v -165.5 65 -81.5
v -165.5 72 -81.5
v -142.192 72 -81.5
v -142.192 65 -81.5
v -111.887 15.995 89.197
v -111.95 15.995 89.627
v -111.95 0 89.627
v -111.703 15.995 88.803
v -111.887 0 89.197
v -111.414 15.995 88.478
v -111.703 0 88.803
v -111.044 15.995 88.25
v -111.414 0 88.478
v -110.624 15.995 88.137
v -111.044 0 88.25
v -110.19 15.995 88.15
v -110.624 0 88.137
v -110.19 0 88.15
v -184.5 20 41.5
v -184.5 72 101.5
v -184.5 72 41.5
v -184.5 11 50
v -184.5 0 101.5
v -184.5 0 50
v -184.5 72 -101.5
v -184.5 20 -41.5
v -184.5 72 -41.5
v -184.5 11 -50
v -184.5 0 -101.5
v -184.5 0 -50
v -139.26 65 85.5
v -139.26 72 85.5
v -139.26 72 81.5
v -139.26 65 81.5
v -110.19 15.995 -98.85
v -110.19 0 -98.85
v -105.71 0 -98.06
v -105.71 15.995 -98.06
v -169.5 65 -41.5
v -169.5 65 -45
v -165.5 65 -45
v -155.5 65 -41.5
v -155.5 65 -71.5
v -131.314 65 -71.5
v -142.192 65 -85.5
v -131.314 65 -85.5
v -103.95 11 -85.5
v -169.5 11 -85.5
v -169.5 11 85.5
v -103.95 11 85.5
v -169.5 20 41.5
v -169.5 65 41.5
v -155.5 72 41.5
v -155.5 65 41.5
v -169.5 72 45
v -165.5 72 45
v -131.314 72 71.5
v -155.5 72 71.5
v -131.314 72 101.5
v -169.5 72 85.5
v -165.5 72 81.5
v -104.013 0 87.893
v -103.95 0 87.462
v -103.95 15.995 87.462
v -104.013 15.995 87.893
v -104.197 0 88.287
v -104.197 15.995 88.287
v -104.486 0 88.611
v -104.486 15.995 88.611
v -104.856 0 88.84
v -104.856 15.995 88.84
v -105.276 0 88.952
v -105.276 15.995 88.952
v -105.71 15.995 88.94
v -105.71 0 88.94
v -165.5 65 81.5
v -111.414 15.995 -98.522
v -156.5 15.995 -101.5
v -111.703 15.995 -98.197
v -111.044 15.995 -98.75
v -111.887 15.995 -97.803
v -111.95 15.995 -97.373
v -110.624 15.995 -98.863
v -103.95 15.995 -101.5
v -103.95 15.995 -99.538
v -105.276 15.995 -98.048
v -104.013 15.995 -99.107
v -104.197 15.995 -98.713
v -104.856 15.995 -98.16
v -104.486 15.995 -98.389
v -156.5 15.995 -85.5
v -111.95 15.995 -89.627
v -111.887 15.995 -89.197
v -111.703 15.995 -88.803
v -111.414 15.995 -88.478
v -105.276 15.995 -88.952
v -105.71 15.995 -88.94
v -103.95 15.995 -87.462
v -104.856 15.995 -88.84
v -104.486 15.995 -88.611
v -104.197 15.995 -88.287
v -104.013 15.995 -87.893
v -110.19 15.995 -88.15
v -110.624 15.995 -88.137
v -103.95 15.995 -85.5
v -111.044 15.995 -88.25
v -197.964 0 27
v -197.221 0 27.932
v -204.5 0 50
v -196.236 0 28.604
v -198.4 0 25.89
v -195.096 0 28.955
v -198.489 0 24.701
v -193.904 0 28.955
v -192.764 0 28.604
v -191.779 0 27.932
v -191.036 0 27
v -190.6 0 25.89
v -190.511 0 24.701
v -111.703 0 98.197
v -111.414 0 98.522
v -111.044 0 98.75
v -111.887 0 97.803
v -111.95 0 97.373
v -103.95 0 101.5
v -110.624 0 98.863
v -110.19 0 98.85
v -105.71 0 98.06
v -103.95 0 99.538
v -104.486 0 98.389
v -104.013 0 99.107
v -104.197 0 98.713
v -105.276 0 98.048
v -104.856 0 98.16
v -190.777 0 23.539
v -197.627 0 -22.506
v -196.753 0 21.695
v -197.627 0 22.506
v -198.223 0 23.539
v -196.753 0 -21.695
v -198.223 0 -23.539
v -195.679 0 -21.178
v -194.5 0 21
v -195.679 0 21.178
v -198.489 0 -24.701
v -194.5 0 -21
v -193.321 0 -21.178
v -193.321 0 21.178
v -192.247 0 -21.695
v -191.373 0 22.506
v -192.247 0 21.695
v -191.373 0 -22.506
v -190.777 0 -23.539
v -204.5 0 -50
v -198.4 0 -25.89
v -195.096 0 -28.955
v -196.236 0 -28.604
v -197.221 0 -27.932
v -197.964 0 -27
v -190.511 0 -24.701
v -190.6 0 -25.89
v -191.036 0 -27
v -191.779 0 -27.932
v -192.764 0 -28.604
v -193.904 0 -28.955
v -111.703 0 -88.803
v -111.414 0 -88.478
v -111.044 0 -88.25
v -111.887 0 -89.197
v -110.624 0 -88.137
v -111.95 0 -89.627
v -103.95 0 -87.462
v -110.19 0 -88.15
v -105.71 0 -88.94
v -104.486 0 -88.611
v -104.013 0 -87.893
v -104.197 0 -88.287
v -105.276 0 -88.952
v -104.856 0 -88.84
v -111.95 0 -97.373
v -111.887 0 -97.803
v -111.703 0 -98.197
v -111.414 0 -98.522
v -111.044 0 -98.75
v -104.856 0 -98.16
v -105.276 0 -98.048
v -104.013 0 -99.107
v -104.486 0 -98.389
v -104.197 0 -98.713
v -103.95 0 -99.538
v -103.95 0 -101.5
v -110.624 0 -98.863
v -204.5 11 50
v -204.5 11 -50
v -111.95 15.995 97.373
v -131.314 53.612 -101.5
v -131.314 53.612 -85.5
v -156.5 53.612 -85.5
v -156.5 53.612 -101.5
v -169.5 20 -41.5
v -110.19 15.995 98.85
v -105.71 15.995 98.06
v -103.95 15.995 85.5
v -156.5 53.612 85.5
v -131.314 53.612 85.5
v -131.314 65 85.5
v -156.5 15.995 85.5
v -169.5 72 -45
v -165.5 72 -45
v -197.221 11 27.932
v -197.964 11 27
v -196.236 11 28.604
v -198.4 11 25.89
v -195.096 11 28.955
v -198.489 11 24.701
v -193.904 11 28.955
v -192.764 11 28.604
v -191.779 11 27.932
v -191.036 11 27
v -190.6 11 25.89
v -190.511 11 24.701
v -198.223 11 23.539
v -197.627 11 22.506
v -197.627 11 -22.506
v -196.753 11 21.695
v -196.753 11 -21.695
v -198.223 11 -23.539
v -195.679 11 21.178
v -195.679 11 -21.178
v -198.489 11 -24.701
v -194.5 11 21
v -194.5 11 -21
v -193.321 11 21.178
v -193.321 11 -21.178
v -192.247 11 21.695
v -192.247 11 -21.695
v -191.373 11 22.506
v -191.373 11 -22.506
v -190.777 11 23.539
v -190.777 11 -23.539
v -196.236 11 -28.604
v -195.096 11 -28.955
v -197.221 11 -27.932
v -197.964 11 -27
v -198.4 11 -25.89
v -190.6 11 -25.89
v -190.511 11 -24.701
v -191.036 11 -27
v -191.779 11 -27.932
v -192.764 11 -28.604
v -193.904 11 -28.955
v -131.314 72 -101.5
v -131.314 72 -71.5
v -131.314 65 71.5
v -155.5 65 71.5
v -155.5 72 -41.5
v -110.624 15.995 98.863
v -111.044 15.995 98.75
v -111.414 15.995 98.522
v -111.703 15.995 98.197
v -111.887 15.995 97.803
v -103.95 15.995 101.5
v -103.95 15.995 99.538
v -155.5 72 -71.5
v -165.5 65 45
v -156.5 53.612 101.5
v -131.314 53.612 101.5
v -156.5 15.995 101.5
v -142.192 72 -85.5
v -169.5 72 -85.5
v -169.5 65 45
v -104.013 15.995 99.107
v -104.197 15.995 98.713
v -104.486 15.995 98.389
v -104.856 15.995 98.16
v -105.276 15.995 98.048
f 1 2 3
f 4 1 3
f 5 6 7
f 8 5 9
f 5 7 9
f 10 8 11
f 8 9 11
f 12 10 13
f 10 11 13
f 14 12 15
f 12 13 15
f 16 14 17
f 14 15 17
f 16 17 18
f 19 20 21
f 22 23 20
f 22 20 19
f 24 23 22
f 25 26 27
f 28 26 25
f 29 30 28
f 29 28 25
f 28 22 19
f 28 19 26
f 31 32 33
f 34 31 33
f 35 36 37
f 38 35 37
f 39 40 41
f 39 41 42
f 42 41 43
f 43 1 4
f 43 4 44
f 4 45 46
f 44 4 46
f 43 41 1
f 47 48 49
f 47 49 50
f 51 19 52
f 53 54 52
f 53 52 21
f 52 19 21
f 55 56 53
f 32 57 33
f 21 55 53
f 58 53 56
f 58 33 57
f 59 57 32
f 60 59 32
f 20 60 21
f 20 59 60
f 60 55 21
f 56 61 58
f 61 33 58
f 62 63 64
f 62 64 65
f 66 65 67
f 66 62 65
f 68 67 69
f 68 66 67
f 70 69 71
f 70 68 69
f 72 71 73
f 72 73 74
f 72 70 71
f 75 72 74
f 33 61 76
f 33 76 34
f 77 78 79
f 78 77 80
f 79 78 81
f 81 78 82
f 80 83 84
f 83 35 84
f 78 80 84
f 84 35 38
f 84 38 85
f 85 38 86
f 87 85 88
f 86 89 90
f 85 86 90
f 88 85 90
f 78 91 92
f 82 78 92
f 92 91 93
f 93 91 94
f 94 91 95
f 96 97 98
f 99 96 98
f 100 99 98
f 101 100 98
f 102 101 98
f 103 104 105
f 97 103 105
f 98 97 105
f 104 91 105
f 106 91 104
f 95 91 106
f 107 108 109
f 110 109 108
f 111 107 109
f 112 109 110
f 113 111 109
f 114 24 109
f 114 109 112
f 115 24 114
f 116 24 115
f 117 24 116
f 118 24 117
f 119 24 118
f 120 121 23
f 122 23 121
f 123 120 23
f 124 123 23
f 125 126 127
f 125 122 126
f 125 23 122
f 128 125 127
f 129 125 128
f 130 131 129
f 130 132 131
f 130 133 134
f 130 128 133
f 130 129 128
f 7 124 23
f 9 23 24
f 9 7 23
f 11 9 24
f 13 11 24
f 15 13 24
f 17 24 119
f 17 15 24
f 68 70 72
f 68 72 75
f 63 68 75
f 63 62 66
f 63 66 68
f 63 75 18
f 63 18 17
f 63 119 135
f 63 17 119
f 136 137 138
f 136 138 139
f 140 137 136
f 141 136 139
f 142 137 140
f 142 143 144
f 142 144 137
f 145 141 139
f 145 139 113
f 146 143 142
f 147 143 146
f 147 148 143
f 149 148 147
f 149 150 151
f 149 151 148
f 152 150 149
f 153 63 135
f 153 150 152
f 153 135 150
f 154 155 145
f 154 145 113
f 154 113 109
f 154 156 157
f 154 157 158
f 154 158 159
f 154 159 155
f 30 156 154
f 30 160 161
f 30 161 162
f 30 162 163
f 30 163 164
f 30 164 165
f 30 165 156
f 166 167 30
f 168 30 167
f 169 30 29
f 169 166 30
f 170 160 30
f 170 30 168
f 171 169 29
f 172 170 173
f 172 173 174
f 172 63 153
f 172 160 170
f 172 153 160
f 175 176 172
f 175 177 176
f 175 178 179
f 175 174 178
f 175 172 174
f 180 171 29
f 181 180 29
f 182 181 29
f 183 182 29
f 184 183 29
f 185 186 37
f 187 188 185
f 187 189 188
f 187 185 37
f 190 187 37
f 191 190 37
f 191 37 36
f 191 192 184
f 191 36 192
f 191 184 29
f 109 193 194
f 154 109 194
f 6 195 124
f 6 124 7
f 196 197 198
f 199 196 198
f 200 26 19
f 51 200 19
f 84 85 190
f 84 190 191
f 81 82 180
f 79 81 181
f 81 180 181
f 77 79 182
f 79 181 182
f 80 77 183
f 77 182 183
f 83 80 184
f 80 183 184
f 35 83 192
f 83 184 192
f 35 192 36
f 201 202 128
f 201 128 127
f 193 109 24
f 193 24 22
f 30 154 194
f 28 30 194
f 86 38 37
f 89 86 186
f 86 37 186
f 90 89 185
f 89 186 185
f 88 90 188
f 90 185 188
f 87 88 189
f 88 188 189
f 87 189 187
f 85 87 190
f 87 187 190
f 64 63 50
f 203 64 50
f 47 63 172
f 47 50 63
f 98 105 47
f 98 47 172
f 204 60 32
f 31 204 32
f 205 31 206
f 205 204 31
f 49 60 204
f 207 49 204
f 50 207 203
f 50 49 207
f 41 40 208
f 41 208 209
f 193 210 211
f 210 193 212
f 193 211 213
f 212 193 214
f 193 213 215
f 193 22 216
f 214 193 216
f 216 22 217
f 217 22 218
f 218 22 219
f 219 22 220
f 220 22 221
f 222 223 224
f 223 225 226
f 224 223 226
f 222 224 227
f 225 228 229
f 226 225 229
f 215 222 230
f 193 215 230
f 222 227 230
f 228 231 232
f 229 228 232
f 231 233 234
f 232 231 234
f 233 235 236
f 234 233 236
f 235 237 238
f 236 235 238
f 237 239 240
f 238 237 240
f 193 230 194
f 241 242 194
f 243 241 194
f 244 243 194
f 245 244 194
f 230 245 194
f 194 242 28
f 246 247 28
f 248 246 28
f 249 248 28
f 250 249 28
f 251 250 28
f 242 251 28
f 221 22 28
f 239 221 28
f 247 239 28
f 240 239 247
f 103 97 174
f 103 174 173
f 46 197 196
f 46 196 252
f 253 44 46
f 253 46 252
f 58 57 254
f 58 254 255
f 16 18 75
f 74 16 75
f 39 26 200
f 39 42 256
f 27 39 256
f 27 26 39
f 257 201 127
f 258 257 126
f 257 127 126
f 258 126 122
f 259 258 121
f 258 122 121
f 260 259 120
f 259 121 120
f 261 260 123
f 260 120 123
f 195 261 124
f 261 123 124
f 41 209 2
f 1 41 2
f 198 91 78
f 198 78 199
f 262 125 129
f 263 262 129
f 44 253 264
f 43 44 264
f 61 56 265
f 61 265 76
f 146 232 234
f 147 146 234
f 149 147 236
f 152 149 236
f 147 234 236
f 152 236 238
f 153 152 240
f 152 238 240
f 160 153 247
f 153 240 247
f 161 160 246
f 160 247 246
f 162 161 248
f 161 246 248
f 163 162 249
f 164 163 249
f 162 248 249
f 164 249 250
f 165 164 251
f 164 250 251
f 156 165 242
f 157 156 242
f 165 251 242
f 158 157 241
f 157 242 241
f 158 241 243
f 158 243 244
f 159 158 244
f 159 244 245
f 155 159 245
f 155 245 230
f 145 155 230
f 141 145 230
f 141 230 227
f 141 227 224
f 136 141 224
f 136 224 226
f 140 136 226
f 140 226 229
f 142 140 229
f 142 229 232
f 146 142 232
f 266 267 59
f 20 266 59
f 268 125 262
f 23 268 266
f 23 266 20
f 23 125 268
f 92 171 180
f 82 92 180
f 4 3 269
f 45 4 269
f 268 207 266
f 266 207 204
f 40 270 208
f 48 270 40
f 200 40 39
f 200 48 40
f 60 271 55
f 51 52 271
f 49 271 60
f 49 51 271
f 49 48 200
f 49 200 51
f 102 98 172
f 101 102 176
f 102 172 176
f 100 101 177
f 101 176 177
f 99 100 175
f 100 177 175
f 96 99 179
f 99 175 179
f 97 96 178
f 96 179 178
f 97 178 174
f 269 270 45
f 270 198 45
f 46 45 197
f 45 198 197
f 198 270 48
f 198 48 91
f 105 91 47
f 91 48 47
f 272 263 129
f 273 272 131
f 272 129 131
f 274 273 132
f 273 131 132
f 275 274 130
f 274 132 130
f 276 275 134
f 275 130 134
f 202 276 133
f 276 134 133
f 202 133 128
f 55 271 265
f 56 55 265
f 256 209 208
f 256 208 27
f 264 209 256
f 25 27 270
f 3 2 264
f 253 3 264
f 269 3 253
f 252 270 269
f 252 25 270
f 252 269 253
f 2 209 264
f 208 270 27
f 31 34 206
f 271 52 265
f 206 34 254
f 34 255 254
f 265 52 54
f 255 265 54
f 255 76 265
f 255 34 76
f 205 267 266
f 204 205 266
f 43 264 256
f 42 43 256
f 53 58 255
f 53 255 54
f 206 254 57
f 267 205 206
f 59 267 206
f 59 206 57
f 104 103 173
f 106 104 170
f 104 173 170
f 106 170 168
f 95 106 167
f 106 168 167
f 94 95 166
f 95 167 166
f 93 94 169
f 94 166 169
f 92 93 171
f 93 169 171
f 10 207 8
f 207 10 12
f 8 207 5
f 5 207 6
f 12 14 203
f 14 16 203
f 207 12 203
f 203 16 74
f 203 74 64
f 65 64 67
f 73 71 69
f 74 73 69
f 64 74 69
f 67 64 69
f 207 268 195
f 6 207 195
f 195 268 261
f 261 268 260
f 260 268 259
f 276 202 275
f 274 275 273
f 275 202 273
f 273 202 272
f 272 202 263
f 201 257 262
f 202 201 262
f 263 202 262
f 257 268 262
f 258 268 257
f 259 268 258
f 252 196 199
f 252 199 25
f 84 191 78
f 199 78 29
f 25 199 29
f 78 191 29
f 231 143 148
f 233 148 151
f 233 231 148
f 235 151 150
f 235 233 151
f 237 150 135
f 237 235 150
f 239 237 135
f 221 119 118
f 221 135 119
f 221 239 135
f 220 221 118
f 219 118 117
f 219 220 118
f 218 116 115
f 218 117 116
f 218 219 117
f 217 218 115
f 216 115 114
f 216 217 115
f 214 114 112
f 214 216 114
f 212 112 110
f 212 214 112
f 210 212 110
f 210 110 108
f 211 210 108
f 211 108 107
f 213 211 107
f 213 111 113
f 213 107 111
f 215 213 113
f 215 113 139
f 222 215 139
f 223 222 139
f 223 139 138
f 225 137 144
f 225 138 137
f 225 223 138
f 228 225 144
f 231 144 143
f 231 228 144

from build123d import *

# Parameters (mm, degrees)
SKETCH1_W                = 369
SKETCH1_H                = 203
BOSS_EXTRUDE1_DEPTH      = 20
SKETCH2_W                = 129
SKETCH2_H                = 16
BOSS_EXTRUDE2_DEPTH      = 12
SKETCH3_W                = 342
SKETCH3_H                = 171
CUT_EXTRUDE1_DEPTH       = 9
SKETCH4_W                = 100
SKETCH4_H                = 12
BOSS_EXTRUDE3_DEPTH      = 60
CUT_EXTRUDE3_START       = -60
CUT_EXTRUDE3_DEPTH       = 70
BOSS_EXTRUDE5_DEPTH      = 40
EXTRUDE_THIN1_DEPTH      = 7
SKETCH10_W               = 404
SKETCH10_H               = 324.796202869
CUT_EXTRUDE4_DEPTH       = 69
CUT_EXTRUDE7_DEPTH       = 284.607563369
CUT_EXTRUDE7_DEPTH_BACK  = 284.607563369
SKETCH14_W               = 37
SKETCH14_H               = 34.717467541
SKETCH12_W               = 50
SKETCH12_H               = 11
BOSS_EXTRUDE6_DEPTH      = 20
SKETCH13_R               = 4
CUT_EXTRUDE6_DEPTH       = 237.312293375
CUT_EXTRUDE9_DEPTH       = 235.150592568
SKETCH16_W               = 11.814467108
SKETCH16_H               = 18.387579902
CUT_EXTRUDE10_DEPTH      = 298.007154796
BOSS_EXTRUDE8_START      = -7
SKETCH18_W               = 7.945182936
SKETCH18_H               = 20.540998505
BOSS_EXTRUDE8_DEPTH      = 7
BOSS_EXTRUDE9_START      = -7
SKETCH19_W               = 10.87781478
SKETCH19_H               = 4
BOSS_EXTRUDE9_DEPTH      = 7
FILLET1_R                = 1.5
CUT_EXTRUDE11_DEPTH      = 298.007154796
CUT_EXTRUDE11_DEPTH_BACK = 298.007154796
SKETCH20_W               = 10
SKETCH20_H               = 2.9
SKETCH21_W               = 8.352928008
SKETCH21_H               = 52
SKETCH21_W_2             = 6.5
CUT_EXTRUDE12_DEPTH      = 149.238161416
SKETCH22_W               = 43.183103185
SKETCH22_H               = 12.42943685
CUT_EXTRUDE13_DEPTH      = 298.007154796


with BuildPart() as part:
    # Sketch1 → Boss-Extrude1 (new body)
    with BuildSketch(Plane(origin=(0, 0, 0), x_dir=(1, 0, 0), z_dir=(0, 1, 0))):
        Rectangle(SKETCH1_W, SKETCH1_H)
    extrude(amount=BOSS_EXTRUDE1_DEPTH)

    # Sketch2 → Boss-Extrude2 (add)
    with BuildSketch(Plane(origin=(0, 20, 0), x_dir=(1, 0, 0), z_dir=(0, 1, 0))):
        Polygon((-184.5, -101.5), (-169.5, -101.5), (-119.5, -101.5), (-119.5, -85.5), (-169.5, -85.5), (-169.5, -36.5), (-184.5, -36.5), align=None)
        Polygon((-184.5, 101.5), (-169.5, 101.5), (-119.5, 101.5), (-119.5, 85.5), (-169.5, 85.5), (-169.5, 36.5), (-184.5, 36.5), align=None)
        with Locations((20, -93.5)):
            Rectangle(SKETCH2_W, SKETCH2_H)
        with Locations((20, 93.5)):
            Rectangle(SKETCH2_W, SKETCH2_H)
    extrude(amount=BOSS_EXTRUDE2_DEPTH)

    # Sketch3 → Cut-Extrude1 (cut)
    with BuildSketch(Plane(origin=(0, 20, 0), x_dir=(1, 0, 0), z_dir=(0, 1, 0))):
        with Locations((1.5, 0)):
            Rectangle(SKETCH3_W, SKETCH3_H)
    extrude(amount=-CUT_EXTRUDE1_DEPTH, mode=Mode.SUBTRACT)

    # Sketch4 → Boss-Extrude3 (add)
    with BuildSketch(Plane(origin=(0, 0, -101.5), x_dir=(-1, 0, 0), z_dir=(0, 0, -1))):
        with Locations((-19.5, 26)):
            Rectangle(SKETCH4_W, SKETCH4_H)
    boss_extrude3 = extrude(amount=BOSS_EXTRUDE3_DEPTH)

    # Sketch6 → Cut-Extrude3 (cut)
    with BuildSketch(Plane.XY.offset(-85.5).offset(CUT_EXTRUDE3_START)):
        with BuildLine():
            Line((-24.5, 32), (-26.787099163, 29.101539441))
            ThreePointArc((-26.787099163, 29.101539441), (-26.9948908, 27.190971116), (-25.366310671, 26.170591063))
            Line((-25.366310671, 26.170591063), (-15.633690062, 26.170591063))
            ThreePointArc((-15.633690062, 26.170591063), (-14.00510936, 27.190970786), (-14.212900837, 29.101539441))
            Line((-14.212900837, 29.101539441), (-16.5, 32))
            Line((-16.5, 32), (-24.5, 32))
        make_face()
        with BuildLine():
            Line((56.5, 32), (54.250139337, 28.697067806))
            ThreePointArc((54.250139337, 28.697067806), (54.153814675, 26.972097696), (55.633689937, 26.080599221))
            Line((55.633689937, 26.080599221), (65.366310546, 26.080599221))
            ThreePointArc((65.366310546, 26.080599221), (66.846185438, 26.972097909), (66.749860663, 28.697067806))
            Line((66.749860663, 28.697067806), (64.5, 32))
            Line((64.5, 32), (56.5, 32))
        make_face()
    cut_extrude3 = extrude(amount=CUT_EXTRUDE3_DEPTH, mode=Mode.SUBTRACT)

    # Sketch8 → Boss-Extrude5 (add)
    with BuildSketch(Plane(origin=(0, 32, 0), x_dir=(1, 0, 0), z_dir=(0, 1, 0))):
        Polygon((-184.5, 36.5), (-169.5, 36.5), (-169.5, 85.5), (-119.5, 85.5), (-119.5, 101.5), (-184.5, 101.5), align=None)
    boss_extrude5 = extrude(amount=BOSS_EXTRUDE5_DEPTH)

    # Sketch9 → Extrude-Thin1 (add)
    with BuildSketch(Plane(origin=(0, 72, 0), x_dir=(1, 0, 0), z_dir=(0, 1, 0))):
        Polygon((-119.5, 85.5), (-119.5, 71.5), (-155.5, 71.5), (-155.5, 35), (-169.5, 35), (-169.5, 45), (-165.5, 45), (-165.5, 81.5), (-129.5, 81.5), (-129.5, 85.5), align=None)
    extrude_thin1 = extrude(amount=-EXTRUDE_THIN1_DEPTH)

    # Mirror2: Boss-Extrude3, Cut-Extrude3, Boss-Extrude5, Extrude-Thin1 across plane
    add(boss_extrude3.mirror(Plane.XY))
    add(cut_extrude3.mirror(Plane.XY), mode=Mode.SUBTRACT)
    add(boss_extrude5.mirror(Plane.XY))
    add(extrude_thin1.mirror(Plane.XY))

    # Sketch10 → Cut-Extrude4 (cut)
    with BuildSketch(Plane(origin=(0, 32, 0), x_dir=(1, 0, 0), z_dir=(0, 1, 0))):
        with Locations((98.05, -0.89352463)):
            Rectangle(SKETCH10_W, SKETCH10_H)
    extrude(amount=-CUT_EXTRUDE4_DEPTH, mode=Mode.SUBTRACT)

    # Sketch14 → Cut-Extrude7 (cut, two sides: drawn at the far end of the back side and taken through both)
    with BuildSketch(Plane(origin=(0, 0, -101.5), x_dir=(-1, 0, 0), z_dir=(0, 0, -1)).offset(-CUT_EXTRUDE7_DEPTH_BACK)):
        with Locations((138, 36.253686327)):
            Rectangle(SKETCH14_W, SKETCH14_H)
    extrude(amount=CUT_EXTRUDE7_DEPTH + CUT_EXTRUDE7_DEPTH_BACK, mode=Mode.SUBTRACT)

    # Sketch12 → Boss-Extrude6 (add)
    with BuildSketch(Plane.ZY.offset(184.5)):
        with Locations((-25, 5.5)):
            Rectangle(SKETCH12_W, SKETCH12_H)
    boss_extrude6 = extrude(amount=BOSS_EXTRUDE6_DEPTH)

    # Sketch13 → Cut-Extrude6 (cut, through all)
    with BuildSketch(Plane(origin=(0, 11, 0), x_dir=(1, 0, 0), z_dir=(0, 1, 0))):
        with Locations(Location((-194.5, 25, 0), (0, 0, 270))):
            Circle(SKETCH13_R)
    cut_extrude6 = extrude(amount=-CUT_EXTRUDE6_DEPTH, mode=Mode.SUBTRACT)

    # Mirror3: Boss-Extrude6, Cut-Extrude6 across plane
    add(boss_extrude6.mirror(Plane.XY))
    add(cut_extrude6.mirror(Plane.XY), mode=Mode.SUBTRACT)

    # Sketch11 → Cut-Extrude9 (cut, through all)
    with BuildSketch(Plane(origin=(0, 20, 0), x_dir=(1, 0, 0), z_dir=(0, 1, 0))):
        Polygon((-103.95, 97.75), (-103.95, 89.25), (-111.95, 87.839384154), (-111.95, 99.160615846), align=None)
        Polygon((-103.95, -89.25), (-103.95, -97.75), (-111.95, -99.160615846), (-111.95, -87.839384154), align=None)
    extrude(amount=-CUT_EXTRUDE9_DEPTH, mode=Mode.SUBTRACT)

    # Sketch16 → Cut-Extrude10 (cut, through all)
    with BuildSketch(Plane.XY.offset(101.5)):
        with Locations((-125.407233554, 62.806210049)):
            Rectangle(SKETCH16_W, SKETCH16_H)
    extrude(amount=-CUT_EXTRUDE10_DEPTH, mode=Mode.SUBTRACT)

    # Sketch18 → Boss-Extrude8 (add)
    with BuildSketch(Plane(origin=(0, 72, 0), x_dir=(1, 0, 0), z_dir=(0, 1, 0)).offset(BOSS_EXTRUDE8_START)):
        with Locations((-135.287058576, -81.770499253)):
            Rectangle(SKETCH18_W, SKETCH18_H)
    extrude(amount=BOSS_EXTRUDE8_DEPTH)

    # Sketch19 → Boss-Extrude9 (add)
    with BuildSketch(Plane(origin=(0, 72, 0), x_dir=(1, 0, 0), z_dir=(0, 1, 0)).offset(BOSS_EXTRUDE9_START)):
        with Locations((-136.753374498, 83.5)):
            Rectangle(SKETCH19_W, SKETCH19_H)
    extrude(amount=BOSS_EXTRUDE9_DEPTH)

    # Fillet1
    fillet1_edges = [part.edges().sort_by_distance(p)[0] for p in [
        (-111.95, 10, -99.160615846),
        (-103.95, 10, -97.75),
        (-103.95, 10, -89.25),
        (-111.95, 10, -87.839384154),
        (-111.95, 10, 99.160615846),
        (-111.95, 10, 87.839384154),
        (-103.95, 10, 89.25),
        (-103.95, 10, 97.75),
    ]]
    fillet(fillet1_edges, radius=FILLET1_R)

    # Sketch20 → Cut-Extrude11 (cut, two sides: drawn at the far end of the back side and taken through both)
    with BuildSketch(Plane.XY.offset(101.5).offset(-CUT_EXTRUDE11_DEPTH_BACK)):
        with Locations((-151.5, 17.444952557)):
            Rectangle(SKETCH20_W, SKETCH20_H)
    extrude(amount=CUT_EXTRUDE11_DEPTH + CUT_EXTRUDE11_DEPTH_BACK, mode=Mode.SUBTRACT)

    # Sketch21 → Cut-Extrude12 (cut, through all)
    with BuildSketch(Plane.ZY.offset(184.5)):
        with Locations((-37.323535996, 46)):
            Rectangle(SKETCH21_W, SKETCH21_H)
        with Locations((38.25, 46)):
            Rectangle(SKETCH21_W_2, SKETCH21_H)
    extrude(amount=-CUT_EXTRUDE12_DEPTH, mode=Mode.SUBTRACT)

    # Sketch22 → Cut-Extrude13 (cut, through all)
    with BuildSketch(Plane.XY.offset(101.5)):
        with Locations((-124.908448408, 22.209670982)):
            Rectangle(SKETCH22_W, SKETCH22_H)
    extrude(amount=-CUT_EXTRUDE13_DEPTH, mode=Mode.SUBTRACT)


solid = part.part
